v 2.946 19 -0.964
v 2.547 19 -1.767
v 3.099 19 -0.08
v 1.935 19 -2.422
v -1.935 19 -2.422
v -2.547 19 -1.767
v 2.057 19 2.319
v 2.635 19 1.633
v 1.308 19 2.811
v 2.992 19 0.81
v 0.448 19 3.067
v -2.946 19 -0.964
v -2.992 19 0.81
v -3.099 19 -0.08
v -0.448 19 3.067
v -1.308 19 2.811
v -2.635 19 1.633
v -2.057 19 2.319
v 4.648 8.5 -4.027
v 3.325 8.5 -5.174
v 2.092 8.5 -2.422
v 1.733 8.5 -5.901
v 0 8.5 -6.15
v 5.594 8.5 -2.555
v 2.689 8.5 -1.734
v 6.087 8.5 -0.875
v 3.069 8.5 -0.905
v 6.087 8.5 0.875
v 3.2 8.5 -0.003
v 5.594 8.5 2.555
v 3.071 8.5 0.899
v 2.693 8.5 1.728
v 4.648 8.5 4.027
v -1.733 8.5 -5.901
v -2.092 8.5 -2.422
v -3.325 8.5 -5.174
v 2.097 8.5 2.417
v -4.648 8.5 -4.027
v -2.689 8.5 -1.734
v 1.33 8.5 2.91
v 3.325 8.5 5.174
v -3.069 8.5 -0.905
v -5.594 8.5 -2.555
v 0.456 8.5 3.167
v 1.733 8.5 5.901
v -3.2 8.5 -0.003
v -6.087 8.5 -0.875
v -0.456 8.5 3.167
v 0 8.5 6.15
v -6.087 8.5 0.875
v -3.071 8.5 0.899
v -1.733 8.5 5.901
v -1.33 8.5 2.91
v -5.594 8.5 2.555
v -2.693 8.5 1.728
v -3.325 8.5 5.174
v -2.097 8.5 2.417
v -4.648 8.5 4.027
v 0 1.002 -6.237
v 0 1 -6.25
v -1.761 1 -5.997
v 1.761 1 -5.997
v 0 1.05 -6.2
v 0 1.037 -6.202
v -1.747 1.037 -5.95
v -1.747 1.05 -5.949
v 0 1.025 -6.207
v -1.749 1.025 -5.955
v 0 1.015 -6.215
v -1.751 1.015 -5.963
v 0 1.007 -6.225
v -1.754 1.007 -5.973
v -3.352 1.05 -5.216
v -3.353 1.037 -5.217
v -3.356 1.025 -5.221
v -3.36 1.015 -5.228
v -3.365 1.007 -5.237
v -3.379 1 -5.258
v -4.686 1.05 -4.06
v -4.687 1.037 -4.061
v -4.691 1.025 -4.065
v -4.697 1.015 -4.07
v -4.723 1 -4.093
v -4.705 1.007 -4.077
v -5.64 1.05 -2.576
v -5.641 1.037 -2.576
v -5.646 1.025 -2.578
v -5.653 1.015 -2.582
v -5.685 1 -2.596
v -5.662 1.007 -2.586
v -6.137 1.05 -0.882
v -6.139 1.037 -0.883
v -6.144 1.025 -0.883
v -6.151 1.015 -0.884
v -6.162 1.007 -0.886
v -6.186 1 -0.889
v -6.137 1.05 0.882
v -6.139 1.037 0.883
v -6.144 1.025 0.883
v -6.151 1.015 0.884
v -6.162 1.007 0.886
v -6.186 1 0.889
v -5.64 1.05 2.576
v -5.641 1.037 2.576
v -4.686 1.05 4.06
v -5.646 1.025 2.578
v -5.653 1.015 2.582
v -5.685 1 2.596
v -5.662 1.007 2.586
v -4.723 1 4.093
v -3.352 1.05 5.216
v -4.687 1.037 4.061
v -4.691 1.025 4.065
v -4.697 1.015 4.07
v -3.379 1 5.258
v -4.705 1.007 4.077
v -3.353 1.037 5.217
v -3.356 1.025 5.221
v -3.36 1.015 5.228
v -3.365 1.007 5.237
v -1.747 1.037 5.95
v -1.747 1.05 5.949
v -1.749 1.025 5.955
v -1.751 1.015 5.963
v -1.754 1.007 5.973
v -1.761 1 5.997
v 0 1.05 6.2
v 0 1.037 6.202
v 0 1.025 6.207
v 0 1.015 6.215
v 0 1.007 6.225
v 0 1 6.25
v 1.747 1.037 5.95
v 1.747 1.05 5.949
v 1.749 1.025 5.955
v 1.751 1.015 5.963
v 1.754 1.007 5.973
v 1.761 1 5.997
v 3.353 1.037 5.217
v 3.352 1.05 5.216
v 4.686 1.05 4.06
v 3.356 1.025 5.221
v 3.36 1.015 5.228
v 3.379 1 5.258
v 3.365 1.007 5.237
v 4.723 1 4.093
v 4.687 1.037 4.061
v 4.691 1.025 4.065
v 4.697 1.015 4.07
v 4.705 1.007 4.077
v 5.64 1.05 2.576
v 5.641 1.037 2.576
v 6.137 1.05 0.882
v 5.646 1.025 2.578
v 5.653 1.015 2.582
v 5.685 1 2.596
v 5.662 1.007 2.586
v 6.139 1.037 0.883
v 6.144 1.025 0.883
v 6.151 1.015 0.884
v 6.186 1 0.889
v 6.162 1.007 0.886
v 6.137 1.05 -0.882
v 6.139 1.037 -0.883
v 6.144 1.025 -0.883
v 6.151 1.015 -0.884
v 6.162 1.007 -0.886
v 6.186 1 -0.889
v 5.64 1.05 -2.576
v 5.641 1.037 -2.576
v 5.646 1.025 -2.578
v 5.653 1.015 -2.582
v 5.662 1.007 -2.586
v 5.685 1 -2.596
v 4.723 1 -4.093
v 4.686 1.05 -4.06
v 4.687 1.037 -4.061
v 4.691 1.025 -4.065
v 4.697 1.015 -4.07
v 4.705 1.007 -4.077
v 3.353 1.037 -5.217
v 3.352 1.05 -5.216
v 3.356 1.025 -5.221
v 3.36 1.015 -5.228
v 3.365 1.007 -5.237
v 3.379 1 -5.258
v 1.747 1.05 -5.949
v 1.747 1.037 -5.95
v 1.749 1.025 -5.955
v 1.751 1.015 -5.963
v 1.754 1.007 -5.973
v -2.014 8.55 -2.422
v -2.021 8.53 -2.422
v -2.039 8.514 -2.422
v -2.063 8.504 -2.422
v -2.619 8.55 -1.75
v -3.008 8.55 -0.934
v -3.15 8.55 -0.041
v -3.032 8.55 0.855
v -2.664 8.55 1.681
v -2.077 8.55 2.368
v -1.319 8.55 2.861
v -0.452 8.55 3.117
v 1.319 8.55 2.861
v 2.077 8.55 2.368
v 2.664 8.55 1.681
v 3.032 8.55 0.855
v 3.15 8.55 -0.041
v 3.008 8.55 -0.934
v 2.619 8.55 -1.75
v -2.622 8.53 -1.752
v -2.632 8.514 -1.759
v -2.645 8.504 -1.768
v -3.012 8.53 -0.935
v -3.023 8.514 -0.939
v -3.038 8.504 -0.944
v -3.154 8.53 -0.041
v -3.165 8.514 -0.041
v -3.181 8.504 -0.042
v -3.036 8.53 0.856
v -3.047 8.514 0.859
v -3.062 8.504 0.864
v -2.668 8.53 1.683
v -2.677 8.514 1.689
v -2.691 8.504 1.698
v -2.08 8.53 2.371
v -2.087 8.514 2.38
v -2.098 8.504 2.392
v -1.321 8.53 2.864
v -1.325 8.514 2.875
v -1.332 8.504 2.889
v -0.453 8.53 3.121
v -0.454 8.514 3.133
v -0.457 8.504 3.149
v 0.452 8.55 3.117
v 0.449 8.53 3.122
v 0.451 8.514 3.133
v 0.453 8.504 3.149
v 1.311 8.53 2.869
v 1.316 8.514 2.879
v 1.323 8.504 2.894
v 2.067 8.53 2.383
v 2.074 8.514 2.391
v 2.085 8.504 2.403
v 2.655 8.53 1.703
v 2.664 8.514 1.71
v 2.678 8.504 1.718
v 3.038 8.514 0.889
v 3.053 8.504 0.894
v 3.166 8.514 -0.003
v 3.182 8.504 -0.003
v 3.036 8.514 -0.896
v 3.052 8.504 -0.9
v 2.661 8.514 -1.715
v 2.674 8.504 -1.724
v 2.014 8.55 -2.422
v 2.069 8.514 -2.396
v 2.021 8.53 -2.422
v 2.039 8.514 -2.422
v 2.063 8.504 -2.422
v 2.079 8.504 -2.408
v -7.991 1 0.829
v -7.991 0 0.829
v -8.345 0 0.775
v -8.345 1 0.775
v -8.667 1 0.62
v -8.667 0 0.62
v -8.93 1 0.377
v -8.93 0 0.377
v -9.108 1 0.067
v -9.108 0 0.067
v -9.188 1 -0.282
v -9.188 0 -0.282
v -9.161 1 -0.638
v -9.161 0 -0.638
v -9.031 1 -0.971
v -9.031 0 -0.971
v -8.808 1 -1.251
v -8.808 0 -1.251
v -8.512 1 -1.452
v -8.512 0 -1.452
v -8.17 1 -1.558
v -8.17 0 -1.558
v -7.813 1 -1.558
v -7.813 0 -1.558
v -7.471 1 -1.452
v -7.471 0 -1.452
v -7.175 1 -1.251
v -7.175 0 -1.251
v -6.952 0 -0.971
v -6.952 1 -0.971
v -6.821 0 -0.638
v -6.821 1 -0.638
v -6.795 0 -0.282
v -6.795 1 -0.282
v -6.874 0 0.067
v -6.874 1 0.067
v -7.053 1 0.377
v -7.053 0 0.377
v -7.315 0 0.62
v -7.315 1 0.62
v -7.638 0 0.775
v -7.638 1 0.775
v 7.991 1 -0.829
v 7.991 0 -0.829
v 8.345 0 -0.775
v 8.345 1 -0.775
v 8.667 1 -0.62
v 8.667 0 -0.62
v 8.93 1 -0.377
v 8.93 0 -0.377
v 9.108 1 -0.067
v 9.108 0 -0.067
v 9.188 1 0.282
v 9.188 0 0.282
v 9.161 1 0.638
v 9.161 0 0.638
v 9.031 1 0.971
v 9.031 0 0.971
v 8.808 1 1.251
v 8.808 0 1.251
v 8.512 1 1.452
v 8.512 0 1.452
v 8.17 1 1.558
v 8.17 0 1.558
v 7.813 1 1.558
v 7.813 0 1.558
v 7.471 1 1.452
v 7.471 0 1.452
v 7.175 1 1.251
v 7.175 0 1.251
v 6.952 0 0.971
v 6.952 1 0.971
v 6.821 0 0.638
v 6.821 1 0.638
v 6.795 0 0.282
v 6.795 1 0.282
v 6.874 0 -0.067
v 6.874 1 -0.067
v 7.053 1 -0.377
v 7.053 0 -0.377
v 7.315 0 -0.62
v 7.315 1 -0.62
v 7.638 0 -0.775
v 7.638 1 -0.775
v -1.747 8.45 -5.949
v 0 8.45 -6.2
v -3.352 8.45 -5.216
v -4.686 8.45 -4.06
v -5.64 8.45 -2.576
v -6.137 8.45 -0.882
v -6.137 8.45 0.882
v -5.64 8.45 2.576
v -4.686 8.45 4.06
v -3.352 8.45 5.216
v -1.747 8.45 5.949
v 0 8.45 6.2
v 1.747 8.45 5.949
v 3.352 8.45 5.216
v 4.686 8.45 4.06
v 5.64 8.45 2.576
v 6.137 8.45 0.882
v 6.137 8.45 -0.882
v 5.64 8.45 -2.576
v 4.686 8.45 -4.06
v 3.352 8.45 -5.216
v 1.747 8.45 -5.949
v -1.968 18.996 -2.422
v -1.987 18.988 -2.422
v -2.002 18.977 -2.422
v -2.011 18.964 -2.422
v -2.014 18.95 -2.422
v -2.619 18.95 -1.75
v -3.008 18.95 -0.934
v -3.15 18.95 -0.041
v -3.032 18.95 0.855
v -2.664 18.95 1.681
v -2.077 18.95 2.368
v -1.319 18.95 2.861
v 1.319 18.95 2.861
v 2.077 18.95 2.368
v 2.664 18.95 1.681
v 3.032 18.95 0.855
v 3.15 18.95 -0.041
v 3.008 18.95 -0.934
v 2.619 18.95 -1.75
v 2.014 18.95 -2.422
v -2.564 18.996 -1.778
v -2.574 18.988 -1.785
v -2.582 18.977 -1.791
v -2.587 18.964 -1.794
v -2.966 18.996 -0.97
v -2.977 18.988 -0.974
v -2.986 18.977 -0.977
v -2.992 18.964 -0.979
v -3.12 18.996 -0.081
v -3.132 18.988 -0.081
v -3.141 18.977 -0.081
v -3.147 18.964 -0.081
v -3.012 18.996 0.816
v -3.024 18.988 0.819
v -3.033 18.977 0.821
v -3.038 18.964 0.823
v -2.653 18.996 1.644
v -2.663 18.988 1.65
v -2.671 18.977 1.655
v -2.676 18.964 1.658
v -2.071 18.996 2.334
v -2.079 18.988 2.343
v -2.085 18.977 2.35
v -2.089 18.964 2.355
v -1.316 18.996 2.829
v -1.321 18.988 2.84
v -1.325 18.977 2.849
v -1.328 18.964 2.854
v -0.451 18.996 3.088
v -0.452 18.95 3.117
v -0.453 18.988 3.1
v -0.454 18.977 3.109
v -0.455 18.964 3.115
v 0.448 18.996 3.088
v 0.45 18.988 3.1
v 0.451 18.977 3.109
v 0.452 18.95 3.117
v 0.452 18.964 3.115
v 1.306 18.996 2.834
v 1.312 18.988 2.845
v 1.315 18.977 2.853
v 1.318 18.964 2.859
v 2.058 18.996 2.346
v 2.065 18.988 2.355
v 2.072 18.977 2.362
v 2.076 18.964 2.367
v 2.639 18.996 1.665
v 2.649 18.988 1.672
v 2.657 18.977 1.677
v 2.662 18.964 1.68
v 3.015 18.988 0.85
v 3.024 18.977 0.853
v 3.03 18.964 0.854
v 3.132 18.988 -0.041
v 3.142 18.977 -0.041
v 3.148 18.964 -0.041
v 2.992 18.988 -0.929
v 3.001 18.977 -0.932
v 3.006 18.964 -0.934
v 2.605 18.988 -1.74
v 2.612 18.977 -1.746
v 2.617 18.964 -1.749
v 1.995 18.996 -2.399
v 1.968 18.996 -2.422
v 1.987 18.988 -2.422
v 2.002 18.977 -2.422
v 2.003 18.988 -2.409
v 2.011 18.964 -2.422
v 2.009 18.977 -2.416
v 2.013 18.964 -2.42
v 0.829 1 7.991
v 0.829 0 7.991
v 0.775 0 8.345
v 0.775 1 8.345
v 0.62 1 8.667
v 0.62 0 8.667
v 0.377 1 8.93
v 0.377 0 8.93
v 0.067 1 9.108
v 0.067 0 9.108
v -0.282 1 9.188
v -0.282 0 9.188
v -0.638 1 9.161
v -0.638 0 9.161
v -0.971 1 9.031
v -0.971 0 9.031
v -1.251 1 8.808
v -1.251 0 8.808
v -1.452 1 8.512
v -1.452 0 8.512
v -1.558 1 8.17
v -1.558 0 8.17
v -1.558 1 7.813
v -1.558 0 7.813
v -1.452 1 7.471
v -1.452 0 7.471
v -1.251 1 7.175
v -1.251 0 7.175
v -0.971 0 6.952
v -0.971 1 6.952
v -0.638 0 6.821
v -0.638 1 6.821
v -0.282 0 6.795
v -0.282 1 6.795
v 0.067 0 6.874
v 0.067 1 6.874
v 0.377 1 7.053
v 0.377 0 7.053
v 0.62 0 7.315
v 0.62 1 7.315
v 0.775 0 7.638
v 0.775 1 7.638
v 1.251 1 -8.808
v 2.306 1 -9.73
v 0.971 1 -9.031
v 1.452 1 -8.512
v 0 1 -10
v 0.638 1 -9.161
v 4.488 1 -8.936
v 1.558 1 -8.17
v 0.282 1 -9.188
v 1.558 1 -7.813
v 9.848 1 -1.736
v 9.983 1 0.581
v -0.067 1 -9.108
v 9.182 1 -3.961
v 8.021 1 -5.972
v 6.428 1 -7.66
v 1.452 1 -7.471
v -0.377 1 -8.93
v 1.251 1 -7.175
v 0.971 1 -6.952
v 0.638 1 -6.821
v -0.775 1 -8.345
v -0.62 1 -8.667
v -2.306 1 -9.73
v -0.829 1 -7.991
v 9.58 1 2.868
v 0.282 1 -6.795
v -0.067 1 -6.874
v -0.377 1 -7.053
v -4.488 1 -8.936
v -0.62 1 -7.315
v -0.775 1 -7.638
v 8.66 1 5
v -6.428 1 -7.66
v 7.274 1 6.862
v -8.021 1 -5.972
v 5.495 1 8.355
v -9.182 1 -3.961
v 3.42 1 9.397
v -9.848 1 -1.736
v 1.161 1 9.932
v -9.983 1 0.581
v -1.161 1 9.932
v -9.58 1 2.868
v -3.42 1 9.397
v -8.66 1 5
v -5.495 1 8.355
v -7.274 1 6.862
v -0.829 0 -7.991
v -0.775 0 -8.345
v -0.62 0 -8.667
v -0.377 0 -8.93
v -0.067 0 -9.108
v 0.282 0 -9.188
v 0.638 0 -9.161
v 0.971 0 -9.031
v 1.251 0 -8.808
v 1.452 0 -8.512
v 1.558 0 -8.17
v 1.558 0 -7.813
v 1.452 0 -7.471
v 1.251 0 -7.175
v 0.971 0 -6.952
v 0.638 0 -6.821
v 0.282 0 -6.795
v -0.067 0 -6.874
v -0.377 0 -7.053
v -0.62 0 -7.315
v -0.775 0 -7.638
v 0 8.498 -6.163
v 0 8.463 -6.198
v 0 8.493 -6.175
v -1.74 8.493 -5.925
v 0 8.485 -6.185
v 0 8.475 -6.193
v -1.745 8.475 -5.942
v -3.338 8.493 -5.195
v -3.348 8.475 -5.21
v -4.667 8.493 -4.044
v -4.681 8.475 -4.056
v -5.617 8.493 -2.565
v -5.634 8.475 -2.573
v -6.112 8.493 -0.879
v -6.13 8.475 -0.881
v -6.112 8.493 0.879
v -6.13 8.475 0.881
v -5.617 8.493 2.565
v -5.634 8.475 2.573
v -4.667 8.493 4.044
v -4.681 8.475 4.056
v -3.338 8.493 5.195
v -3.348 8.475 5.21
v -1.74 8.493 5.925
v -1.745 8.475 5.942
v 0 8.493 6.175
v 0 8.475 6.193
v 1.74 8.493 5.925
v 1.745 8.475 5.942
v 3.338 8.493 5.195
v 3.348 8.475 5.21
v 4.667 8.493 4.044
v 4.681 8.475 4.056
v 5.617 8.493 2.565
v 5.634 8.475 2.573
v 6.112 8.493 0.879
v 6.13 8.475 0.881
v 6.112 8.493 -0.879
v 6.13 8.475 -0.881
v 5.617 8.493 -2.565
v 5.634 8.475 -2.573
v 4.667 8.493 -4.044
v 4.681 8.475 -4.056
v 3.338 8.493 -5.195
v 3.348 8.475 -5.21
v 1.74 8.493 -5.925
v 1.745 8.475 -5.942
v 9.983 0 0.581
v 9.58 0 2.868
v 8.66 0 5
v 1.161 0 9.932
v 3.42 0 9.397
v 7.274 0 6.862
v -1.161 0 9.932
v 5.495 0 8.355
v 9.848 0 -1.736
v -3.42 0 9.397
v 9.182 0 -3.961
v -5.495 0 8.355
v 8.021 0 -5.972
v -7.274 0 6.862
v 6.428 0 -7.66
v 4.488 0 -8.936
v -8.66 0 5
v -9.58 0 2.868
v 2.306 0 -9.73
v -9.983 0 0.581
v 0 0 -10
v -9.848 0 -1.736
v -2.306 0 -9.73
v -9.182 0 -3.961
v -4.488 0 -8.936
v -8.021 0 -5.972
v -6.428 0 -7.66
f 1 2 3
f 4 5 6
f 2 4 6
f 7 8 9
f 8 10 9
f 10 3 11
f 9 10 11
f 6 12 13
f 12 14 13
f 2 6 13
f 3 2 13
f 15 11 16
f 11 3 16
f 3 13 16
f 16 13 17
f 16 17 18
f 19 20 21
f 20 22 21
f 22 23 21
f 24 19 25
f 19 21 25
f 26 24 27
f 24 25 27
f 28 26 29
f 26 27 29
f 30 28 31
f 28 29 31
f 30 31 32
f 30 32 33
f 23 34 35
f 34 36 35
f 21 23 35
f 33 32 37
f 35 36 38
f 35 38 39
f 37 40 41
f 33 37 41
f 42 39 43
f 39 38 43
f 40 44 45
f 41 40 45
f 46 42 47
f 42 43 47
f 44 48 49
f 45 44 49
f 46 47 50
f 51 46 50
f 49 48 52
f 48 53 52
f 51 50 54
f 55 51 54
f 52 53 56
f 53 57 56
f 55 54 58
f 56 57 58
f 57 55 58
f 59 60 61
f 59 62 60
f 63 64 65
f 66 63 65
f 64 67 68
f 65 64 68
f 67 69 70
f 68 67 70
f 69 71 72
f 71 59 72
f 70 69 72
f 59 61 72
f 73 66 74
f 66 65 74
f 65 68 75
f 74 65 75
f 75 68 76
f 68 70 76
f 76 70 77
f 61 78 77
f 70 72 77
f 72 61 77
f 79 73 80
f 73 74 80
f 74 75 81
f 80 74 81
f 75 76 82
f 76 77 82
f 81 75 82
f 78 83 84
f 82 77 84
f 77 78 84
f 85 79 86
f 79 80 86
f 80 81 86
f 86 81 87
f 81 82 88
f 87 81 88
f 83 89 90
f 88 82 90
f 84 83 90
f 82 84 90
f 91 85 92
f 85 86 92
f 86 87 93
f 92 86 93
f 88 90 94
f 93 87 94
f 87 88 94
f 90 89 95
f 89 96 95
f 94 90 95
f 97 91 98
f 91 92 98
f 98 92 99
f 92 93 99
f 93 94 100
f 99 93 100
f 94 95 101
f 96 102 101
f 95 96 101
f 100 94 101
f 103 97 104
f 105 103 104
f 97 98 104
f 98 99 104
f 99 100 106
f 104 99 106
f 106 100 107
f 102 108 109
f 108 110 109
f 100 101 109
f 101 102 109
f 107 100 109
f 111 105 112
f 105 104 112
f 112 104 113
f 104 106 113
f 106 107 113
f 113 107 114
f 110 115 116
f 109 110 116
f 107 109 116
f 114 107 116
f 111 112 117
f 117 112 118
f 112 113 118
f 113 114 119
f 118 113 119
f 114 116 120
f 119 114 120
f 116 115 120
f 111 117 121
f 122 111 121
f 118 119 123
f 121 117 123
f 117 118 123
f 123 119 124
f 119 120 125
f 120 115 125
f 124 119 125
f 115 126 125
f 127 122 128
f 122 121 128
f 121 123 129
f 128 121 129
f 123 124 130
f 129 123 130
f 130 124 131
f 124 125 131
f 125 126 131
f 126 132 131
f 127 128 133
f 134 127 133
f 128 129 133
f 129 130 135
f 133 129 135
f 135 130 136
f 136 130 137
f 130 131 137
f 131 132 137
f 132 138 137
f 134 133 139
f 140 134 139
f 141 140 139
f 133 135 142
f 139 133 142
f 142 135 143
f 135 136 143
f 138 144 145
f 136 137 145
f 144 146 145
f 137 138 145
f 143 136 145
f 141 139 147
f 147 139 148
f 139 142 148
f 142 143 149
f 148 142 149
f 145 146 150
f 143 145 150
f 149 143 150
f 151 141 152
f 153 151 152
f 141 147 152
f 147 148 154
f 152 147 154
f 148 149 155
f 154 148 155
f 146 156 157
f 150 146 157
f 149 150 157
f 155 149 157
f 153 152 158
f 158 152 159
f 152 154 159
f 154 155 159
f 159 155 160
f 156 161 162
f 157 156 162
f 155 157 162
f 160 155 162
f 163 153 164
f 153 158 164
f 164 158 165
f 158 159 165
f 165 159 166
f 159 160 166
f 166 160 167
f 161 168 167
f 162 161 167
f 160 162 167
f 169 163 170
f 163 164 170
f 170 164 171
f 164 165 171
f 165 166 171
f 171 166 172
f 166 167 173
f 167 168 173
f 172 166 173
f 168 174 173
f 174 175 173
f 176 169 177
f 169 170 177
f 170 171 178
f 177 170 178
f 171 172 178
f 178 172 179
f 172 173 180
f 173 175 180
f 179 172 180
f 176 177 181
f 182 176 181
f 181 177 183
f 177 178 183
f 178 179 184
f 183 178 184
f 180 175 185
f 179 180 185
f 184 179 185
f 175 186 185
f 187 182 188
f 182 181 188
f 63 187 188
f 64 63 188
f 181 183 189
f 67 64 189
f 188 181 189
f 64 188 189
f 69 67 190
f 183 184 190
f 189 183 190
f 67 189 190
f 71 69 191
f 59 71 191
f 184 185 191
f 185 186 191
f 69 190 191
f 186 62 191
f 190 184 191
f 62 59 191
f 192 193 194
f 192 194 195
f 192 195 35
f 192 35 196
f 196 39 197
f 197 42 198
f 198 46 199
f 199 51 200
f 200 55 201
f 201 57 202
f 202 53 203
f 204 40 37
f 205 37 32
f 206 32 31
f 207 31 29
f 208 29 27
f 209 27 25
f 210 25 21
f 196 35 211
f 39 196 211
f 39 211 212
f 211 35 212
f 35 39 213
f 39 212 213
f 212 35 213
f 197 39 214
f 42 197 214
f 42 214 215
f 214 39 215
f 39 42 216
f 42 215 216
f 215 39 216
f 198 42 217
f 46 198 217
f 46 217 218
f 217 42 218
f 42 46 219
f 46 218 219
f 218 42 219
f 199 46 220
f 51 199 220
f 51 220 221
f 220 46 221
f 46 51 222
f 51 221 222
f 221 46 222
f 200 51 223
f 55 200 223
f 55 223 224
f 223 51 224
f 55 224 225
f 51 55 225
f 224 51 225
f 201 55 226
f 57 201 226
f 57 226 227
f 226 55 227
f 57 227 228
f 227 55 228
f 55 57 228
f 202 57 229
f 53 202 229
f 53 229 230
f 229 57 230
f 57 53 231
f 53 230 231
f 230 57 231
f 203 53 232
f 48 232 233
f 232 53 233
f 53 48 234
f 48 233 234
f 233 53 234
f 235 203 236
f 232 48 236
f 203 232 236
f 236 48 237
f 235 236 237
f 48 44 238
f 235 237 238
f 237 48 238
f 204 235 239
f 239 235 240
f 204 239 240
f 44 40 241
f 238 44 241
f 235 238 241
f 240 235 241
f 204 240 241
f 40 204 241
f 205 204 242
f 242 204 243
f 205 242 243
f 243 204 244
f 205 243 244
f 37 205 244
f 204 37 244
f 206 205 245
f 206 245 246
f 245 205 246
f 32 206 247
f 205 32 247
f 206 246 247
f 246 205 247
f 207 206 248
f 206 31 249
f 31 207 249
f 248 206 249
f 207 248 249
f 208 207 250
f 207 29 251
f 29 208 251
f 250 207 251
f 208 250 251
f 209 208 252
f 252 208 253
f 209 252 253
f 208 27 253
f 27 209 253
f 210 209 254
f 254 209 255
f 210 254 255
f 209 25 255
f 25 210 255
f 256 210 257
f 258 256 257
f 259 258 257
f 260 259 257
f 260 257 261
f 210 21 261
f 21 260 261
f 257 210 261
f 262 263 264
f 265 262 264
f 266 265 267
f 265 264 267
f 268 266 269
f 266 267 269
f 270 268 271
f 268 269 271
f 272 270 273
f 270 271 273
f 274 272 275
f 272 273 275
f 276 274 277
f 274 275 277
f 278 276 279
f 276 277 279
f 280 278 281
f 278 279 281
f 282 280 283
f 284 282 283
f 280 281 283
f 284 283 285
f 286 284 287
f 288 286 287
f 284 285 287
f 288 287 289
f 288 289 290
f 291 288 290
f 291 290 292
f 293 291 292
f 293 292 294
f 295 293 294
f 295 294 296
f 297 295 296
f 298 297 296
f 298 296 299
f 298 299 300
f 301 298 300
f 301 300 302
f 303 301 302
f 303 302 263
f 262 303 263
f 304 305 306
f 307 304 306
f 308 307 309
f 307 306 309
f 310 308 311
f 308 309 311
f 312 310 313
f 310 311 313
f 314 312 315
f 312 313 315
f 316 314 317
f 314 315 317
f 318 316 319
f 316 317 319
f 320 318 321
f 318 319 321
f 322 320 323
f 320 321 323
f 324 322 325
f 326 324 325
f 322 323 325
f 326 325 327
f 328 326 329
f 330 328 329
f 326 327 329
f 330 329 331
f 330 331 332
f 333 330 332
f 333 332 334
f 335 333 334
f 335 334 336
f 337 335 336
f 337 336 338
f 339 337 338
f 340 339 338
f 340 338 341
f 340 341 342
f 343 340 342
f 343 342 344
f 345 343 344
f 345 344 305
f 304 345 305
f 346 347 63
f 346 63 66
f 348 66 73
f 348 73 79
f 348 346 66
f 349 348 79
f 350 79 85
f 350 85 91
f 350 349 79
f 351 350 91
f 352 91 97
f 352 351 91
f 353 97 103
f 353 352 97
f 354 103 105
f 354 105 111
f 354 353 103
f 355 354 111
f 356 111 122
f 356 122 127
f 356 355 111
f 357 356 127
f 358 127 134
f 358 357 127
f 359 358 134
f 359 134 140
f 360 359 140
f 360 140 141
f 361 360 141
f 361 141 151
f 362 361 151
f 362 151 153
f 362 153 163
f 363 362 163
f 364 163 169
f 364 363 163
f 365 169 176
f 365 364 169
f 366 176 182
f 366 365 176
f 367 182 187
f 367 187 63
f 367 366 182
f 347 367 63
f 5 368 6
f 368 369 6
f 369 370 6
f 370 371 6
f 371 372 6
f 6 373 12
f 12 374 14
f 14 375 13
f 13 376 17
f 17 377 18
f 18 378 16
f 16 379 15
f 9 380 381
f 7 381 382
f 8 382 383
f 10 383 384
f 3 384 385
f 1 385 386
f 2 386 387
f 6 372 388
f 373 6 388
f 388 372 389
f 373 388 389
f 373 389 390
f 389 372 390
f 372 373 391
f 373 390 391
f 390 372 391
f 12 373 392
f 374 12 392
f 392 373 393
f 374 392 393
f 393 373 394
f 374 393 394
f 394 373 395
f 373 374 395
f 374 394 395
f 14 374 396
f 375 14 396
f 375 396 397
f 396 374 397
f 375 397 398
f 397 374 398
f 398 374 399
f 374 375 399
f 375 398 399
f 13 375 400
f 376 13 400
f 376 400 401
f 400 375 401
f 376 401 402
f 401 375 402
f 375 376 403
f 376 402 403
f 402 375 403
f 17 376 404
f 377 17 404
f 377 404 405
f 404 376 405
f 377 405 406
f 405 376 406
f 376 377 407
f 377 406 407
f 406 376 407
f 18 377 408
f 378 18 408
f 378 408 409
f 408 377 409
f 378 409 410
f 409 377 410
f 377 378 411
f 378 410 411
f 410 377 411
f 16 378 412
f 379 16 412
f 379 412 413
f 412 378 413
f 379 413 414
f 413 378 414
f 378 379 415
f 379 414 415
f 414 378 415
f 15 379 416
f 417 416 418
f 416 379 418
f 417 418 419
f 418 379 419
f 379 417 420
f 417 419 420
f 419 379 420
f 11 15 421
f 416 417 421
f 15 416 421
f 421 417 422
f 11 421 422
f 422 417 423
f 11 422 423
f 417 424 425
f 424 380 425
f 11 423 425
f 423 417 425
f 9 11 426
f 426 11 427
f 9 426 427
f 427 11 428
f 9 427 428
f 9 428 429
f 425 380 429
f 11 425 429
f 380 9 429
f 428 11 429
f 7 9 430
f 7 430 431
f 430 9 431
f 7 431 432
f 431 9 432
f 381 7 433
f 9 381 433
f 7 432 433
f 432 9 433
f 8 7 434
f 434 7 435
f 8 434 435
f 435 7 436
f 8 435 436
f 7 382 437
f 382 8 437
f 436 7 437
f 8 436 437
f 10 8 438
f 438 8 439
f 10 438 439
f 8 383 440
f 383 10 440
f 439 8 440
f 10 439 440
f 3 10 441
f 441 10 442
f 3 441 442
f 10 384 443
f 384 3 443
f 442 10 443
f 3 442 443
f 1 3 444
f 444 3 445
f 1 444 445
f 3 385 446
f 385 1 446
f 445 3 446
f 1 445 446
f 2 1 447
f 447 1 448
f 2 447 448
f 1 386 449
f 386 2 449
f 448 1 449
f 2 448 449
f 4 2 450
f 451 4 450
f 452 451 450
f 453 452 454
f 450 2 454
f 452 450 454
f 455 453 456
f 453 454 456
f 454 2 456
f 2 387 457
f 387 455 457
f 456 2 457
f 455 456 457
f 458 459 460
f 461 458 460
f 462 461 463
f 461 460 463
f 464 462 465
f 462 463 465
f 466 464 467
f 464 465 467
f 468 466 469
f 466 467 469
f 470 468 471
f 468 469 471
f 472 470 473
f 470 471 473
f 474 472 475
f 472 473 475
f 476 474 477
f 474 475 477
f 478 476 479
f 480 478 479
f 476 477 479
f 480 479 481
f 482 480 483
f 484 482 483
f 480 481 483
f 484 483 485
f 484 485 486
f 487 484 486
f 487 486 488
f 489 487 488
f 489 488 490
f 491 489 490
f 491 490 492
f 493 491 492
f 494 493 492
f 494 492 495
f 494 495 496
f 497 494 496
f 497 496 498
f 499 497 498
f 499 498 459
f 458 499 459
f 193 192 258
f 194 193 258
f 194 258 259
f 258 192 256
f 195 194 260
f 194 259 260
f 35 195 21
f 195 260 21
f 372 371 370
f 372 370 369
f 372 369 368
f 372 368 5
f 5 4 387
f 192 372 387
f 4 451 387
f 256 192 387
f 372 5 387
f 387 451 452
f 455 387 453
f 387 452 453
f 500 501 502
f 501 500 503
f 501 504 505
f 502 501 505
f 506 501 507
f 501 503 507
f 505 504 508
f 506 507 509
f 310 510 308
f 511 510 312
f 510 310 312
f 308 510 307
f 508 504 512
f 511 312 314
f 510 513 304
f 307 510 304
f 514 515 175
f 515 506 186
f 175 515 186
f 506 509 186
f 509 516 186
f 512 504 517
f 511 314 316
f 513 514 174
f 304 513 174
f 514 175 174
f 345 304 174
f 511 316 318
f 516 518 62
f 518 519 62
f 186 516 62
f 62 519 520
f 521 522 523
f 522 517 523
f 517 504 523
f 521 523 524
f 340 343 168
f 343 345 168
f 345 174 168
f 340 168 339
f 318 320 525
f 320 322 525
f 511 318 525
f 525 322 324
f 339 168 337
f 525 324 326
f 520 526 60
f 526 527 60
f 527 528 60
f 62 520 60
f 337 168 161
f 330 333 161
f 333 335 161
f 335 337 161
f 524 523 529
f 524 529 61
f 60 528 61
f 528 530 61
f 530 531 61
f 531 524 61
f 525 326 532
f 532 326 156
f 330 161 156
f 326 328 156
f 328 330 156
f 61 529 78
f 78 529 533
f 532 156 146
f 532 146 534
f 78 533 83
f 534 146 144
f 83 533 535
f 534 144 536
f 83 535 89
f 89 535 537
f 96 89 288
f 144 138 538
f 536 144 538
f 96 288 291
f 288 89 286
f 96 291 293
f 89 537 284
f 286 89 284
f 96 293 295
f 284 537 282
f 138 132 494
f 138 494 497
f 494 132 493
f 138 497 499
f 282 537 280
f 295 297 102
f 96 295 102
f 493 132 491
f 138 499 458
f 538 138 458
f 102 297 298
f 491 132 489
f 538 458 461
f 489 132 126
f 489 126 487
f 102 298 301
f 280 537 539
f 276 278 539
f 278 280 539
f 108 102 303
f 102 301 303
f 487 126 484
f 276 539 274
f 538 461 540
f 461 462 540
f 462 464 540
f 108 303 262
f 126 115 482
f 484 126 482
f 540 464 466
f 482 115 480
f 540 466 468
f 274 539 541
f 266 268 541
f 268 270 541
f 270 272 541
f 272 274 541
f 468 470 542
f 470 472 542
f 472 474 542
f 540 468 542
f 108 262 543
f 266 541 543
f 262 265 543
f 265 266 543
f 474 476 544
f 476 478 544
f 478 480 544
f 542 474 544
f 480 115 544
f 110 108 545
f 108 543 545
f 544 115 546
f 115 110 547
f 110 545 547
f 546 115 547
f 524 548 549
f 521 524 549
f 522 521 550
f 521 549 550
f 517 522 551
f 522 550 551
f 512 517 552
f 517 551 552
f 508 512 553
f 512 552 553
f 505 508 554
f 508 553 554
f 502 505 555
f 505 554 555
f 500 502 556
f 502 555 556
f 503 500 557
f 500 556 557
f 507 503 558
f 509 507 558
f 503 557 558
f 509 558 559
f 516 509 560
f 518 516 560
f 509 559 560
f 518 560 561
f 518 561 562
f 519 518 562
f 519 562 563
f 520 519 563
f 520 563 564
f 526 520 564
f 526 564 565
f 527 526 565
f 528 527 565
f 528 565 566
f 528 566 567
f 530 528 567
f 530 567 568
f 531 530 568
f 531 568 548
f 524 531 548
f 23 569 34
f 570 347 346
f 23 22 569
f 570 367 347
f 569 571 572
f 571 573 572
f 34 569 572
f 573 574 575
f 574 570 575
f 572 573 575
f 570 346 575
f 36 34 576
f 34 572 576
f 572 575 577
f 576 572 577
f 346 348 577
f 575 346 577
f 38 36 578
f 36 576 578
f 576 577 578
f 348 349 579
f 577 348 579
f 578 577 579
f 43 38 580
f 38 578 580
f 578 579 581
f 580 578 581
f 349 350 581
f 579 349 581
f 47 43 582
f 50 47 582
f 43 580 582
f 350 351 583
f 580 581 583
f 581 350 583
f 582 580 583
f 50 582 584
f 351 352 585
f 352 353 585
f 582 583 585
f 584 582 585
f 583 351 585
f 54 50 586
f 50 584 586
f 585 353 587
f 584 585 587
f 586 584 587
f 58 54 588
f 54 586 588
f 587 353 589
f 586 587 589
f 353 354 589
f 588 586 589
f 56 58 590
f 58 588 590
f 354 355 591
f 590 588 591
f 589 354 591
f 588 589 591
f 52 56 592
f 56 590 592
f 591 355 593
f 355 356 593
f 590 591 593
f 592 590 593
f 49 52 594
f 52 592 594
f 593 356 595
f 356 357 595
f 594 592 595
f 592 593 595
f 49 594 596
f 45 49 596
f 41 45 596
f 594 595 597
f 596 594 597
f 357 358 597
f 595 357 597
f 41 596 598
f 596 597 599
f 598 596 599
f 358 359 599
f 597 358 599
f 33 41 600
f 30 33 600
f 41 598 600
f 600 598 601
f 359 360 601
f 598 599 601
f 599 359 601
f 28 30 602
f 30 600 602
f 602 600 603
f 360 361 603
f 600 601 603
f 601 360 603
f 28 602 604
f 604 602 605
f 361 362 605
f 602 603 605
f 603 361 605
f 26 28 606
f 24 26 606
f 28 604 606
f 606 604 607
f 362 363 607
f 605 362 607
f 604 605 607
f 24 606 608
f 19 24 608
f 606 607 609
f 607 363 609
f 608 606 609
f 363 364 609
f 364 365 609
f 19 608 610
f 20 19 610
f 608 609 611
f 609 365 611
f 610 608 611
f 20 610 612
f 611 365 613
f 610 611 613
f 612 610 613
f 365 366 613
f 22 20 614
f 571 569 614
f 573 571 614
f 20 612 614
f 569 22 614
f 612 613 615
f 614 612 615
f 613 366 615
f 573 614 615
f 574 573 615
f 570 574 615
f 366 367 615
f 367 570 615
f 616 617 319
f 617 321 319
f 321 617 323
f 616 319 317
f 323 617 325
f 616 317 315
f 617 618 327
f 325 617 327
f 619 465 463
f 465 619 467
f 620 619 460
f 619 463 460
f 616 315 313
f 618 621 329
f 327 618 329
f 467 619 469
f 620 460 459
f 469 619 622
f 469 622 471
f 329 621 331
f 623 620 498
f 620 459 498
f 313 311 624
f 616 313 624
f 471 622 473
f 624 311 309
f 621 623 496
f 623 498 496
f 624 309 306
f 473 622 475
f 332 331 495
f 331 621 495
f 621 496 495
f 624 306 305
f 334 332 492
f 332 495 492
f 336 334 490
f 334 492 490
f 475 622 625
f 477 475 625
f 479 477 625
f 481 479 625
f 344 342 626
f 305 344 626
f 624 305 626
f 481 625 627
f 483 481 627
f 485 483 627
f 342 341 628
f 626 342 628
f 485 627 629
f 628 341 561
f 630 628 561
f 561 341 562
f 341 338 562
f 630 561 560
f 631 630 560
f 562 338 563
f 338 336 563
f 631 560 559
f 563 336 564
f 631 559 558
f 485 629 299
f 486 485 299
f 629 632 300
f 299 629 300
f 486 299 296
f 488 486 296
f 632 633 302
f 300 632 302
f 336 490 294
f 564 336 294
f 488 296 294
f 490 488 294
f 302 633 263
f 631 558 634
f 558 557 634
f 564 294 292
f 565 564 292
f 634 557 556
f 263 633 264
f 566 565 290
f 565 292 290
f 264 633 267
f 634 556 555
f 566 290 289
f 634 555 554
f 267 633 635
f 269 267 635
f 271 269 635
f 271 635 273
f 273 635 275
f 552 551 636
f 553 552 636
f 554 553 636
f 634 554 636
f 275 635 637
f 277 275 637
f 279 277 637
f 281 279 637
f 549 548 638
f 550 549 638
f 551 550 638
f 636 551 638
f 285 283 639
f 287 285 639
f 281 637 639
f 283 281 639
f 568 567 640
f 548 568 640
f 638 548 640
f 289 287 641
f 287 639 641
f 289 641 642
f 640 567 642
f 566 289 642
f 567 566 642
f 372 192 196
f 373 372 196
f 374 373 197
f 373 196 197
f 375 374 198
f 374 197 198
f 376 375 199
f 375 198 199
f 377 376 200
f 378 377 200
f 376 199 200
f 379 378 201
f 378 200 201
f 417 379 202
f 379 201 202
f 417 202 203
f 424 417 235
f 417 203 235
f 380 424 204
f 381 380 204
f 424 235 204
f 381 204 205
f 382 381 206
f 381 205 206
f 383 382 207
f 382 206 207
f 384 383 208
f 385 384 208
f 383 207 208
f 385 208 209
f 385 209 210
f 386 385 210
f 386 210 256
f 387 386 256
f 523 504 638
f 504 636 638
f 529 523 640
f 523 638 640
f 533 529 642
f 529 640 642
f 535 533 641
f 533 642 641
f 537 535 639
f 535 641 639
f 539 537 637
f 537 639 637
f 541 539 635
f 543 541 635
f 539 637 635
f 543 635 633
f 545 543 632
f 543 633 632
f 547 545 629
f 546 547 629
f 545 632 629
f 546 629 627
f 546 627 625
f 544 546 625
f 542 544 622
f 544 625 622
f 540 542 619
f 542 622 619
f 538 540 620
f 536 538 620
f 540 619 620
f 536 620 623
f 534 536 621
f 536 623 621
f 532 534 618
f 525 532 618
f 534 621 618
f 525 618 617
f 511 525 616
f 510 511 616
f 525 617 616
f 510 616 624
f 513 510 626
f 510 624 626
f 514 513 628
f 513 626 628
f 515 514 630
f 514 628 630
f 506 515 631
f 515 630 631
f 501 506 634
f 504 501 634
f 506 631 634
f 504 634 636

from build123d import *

# Parameters (mm, degrees)
ESQUISSE3_W                  = 6.57785754
ESQUISSE3_H                  = 1.386048805
ENL_V_MAT_EXTRU_1_DEPTH      = 10.5
D_GAGEMENT_M21_D             = 2.4
R_P_TITION_CIRCULAIRE1_COUNT = 4
CONG_1_R                     = 0.05


with BuildPart() as part:
    # Esquisse2 → Révolution2 (revolve)
    with BuildSketch(Plane.XY, mode=Mode.PRIVATE) as r_volution2_sk:
        Polygon((0, 19), (3.15, 19), (3.15, 8.5), (6.2, 8.5), (6.2, 3), (6.2, 1), (10, 1), (10, 0), (0, 0), align=None)
    revolve(r_volution2_sk.sketch.rotate(Axis((0, 0, 0), (0, 1, 0)), 90), axis=Axis((0, 0, 0), (0, 1, 0)))

    # Esquisse3 → Enlèv. mat.-Extru.1 (cut)
    with BuildSketch(Plane(origin=(0, 19, 0), x_dir=(1, 0, 0), z_dir=(0, 1, 0))):
        with Locations((-0.352413472, 3.114928535)):
            Rectangle(ESQUISSE3_W, ESQUISSE3_H)
    extrude(amount=-ENL_V_MAT_EXTRU_1_DEPTH, mode=Mode.SUBTRACT)

    # Dégagement M21 (through all)
    with Locations(Plane(origin=(0, 1, 0), x_dir=(1, 0, 0), z_dir=(0, 1, 0))):
        with Locations((0.371303159, 7.991378727)):
            d_gagement_m21 = Hole(D_GAGEMENT_M21_D / 2)

    # Répétition circulaire1: Dégagement M21 ×4 about axis
    r_p_tition_circulaire1_axis = Axis((0, 0, 0), (0, 1, 0))
    for i in range(1, R_P_TITION_CIRCULAIRE1_COUNT):
        add(d_gagement_m21.rotate(r_p_tition_circulaire1_axis, i * 360 / R_P_TITION_CIRCULAIRE1_COUNT), mode=Mode.SUBTRACT)

    # Congé1
    cong_1_edges = [part.edges().sort_by_distance(p)[0] for p in [
        (0, 1, 6.2),
        (0, 8.5, 6.2),
        (0, 8.5, 3.15),
        (0, 19, 3.15),
    ]]
    fillet(cong_1_edges, radius=CONG_1_R)


solid = part.part
